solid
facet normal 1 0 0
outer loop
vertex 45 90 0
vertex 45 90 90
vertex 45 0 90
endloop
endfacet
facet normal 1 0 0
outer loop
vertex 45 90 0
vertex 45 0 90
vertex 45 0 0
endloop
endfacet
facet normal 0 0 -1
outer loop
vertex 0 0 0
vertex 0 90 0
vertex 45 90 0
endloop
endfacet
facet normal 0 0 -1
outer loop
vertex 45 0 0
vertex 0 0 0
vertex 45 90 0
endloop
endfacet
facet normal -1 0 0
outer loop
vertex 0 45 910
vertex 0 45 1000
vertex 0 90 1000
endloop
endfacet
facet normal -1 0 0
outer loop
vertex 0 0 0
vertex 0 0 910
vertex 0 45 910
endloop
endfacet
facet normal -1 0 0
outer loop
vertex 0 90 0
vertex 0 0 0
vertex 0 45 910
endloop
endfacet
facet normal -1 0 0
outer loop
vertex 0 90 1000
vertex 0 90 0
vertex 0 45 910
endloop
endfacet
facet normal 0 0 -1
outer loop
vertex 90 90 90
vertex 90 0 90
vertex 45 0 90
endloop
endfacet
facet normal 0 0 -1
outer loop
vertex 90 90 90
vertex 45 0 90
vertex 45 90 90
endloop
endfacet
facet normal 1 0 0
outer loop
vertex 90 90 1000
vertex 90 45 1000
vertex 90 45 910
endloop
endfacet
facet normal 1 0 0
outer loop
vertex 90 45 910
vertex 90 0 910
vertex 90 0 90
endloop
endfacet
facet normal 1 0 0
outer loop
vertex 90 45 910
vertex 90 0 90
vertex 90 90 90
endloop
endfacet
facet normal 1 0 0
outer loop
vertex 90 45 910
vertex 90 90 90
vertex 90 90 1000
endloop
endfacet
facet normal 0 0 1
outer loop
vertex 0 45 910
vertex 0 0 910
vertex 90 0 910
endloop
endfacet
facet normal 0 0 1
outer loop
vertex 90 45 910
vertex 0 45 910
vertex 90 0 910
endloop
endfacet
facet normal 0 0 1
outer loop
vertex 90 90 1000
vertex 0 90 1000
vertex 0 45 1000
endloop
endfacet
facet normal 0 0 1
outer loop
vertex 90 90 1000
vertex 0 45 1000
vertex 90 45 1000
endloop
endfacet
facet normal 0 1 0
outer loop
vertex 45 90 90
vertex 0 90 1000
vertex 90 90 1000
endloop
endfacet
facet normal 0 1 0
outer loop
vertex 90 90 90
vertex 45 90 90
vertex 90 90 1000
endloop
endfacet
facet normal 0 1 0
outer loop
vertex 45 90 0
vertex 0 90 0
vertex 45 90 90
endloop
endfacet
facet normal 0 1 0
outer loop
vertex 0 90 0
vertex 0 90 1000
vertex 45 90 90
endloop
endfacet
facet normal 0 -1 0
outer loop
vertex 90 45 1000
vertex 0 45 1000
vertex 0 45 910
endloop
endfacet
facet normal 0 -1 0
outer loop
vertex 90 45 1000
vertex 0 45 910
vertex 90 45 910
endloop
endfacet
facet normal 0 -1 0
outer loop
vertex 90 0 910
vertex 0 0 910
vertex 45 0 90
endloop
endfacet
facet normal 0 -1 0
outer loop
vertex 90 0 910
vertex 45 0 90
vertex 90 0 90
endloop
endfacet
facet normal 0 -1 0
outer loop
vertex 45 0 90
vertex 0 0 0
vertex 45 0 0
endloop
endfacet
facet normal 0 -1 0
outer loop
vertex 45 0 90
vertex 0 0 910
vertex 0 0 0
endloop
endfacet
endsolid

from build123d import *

# Parameters (mm, degrees)
SKETCH1_W           = 90
SKETCH1_H           = 90
BOSS_EXTRUDE1_DEPTH = 1000
SKETCH3_W           = 90
SKETCH3_H           = 90
CUT_EXTRUDE1_DEPTH  = 45
SKETCH4_W           = 90
SKETCH4_H           = 90
CUT_EXTRUDE2_DEPTH  = 45


with BuildPart() as part:
    # Sketch1 → Boss-Extrude1 (new body)
    with BuildSketch(Plane.XY):
        with Locations((45, 45)):
            Rectangle(SKETCH1_W, SKETCH1_H)
    extrude(amount=BOSS_EXTRUDE1_DEPTH)

    # Sketch3 → Cut-Extrude1 (cut)
    with BuildSketch(Plane.XZ):
        with Locations((45, 955)):
            Rectangle(SKETCH3_W, SKETCH3_H)
    extrude(amount=-CUT_EXTRUDE1_DEPTH, mode=Mode.SUBTRACT)

    # Sketch4 → Cut-Extrude2 (cut)
    with BuildSketch(Plane(origin=(90, 0, 0), x_dir=(0, 0, -1), z_dir=(1, 0, 0))):
        with Locations((-45, 45)):
            Rectangle(SKETCH4_W, SKETCH4_H)
    extrude(amount=-CUT_EXTRUDE2_DEPTH, mode=Mode.SUBTRACT)


solid = part.part
